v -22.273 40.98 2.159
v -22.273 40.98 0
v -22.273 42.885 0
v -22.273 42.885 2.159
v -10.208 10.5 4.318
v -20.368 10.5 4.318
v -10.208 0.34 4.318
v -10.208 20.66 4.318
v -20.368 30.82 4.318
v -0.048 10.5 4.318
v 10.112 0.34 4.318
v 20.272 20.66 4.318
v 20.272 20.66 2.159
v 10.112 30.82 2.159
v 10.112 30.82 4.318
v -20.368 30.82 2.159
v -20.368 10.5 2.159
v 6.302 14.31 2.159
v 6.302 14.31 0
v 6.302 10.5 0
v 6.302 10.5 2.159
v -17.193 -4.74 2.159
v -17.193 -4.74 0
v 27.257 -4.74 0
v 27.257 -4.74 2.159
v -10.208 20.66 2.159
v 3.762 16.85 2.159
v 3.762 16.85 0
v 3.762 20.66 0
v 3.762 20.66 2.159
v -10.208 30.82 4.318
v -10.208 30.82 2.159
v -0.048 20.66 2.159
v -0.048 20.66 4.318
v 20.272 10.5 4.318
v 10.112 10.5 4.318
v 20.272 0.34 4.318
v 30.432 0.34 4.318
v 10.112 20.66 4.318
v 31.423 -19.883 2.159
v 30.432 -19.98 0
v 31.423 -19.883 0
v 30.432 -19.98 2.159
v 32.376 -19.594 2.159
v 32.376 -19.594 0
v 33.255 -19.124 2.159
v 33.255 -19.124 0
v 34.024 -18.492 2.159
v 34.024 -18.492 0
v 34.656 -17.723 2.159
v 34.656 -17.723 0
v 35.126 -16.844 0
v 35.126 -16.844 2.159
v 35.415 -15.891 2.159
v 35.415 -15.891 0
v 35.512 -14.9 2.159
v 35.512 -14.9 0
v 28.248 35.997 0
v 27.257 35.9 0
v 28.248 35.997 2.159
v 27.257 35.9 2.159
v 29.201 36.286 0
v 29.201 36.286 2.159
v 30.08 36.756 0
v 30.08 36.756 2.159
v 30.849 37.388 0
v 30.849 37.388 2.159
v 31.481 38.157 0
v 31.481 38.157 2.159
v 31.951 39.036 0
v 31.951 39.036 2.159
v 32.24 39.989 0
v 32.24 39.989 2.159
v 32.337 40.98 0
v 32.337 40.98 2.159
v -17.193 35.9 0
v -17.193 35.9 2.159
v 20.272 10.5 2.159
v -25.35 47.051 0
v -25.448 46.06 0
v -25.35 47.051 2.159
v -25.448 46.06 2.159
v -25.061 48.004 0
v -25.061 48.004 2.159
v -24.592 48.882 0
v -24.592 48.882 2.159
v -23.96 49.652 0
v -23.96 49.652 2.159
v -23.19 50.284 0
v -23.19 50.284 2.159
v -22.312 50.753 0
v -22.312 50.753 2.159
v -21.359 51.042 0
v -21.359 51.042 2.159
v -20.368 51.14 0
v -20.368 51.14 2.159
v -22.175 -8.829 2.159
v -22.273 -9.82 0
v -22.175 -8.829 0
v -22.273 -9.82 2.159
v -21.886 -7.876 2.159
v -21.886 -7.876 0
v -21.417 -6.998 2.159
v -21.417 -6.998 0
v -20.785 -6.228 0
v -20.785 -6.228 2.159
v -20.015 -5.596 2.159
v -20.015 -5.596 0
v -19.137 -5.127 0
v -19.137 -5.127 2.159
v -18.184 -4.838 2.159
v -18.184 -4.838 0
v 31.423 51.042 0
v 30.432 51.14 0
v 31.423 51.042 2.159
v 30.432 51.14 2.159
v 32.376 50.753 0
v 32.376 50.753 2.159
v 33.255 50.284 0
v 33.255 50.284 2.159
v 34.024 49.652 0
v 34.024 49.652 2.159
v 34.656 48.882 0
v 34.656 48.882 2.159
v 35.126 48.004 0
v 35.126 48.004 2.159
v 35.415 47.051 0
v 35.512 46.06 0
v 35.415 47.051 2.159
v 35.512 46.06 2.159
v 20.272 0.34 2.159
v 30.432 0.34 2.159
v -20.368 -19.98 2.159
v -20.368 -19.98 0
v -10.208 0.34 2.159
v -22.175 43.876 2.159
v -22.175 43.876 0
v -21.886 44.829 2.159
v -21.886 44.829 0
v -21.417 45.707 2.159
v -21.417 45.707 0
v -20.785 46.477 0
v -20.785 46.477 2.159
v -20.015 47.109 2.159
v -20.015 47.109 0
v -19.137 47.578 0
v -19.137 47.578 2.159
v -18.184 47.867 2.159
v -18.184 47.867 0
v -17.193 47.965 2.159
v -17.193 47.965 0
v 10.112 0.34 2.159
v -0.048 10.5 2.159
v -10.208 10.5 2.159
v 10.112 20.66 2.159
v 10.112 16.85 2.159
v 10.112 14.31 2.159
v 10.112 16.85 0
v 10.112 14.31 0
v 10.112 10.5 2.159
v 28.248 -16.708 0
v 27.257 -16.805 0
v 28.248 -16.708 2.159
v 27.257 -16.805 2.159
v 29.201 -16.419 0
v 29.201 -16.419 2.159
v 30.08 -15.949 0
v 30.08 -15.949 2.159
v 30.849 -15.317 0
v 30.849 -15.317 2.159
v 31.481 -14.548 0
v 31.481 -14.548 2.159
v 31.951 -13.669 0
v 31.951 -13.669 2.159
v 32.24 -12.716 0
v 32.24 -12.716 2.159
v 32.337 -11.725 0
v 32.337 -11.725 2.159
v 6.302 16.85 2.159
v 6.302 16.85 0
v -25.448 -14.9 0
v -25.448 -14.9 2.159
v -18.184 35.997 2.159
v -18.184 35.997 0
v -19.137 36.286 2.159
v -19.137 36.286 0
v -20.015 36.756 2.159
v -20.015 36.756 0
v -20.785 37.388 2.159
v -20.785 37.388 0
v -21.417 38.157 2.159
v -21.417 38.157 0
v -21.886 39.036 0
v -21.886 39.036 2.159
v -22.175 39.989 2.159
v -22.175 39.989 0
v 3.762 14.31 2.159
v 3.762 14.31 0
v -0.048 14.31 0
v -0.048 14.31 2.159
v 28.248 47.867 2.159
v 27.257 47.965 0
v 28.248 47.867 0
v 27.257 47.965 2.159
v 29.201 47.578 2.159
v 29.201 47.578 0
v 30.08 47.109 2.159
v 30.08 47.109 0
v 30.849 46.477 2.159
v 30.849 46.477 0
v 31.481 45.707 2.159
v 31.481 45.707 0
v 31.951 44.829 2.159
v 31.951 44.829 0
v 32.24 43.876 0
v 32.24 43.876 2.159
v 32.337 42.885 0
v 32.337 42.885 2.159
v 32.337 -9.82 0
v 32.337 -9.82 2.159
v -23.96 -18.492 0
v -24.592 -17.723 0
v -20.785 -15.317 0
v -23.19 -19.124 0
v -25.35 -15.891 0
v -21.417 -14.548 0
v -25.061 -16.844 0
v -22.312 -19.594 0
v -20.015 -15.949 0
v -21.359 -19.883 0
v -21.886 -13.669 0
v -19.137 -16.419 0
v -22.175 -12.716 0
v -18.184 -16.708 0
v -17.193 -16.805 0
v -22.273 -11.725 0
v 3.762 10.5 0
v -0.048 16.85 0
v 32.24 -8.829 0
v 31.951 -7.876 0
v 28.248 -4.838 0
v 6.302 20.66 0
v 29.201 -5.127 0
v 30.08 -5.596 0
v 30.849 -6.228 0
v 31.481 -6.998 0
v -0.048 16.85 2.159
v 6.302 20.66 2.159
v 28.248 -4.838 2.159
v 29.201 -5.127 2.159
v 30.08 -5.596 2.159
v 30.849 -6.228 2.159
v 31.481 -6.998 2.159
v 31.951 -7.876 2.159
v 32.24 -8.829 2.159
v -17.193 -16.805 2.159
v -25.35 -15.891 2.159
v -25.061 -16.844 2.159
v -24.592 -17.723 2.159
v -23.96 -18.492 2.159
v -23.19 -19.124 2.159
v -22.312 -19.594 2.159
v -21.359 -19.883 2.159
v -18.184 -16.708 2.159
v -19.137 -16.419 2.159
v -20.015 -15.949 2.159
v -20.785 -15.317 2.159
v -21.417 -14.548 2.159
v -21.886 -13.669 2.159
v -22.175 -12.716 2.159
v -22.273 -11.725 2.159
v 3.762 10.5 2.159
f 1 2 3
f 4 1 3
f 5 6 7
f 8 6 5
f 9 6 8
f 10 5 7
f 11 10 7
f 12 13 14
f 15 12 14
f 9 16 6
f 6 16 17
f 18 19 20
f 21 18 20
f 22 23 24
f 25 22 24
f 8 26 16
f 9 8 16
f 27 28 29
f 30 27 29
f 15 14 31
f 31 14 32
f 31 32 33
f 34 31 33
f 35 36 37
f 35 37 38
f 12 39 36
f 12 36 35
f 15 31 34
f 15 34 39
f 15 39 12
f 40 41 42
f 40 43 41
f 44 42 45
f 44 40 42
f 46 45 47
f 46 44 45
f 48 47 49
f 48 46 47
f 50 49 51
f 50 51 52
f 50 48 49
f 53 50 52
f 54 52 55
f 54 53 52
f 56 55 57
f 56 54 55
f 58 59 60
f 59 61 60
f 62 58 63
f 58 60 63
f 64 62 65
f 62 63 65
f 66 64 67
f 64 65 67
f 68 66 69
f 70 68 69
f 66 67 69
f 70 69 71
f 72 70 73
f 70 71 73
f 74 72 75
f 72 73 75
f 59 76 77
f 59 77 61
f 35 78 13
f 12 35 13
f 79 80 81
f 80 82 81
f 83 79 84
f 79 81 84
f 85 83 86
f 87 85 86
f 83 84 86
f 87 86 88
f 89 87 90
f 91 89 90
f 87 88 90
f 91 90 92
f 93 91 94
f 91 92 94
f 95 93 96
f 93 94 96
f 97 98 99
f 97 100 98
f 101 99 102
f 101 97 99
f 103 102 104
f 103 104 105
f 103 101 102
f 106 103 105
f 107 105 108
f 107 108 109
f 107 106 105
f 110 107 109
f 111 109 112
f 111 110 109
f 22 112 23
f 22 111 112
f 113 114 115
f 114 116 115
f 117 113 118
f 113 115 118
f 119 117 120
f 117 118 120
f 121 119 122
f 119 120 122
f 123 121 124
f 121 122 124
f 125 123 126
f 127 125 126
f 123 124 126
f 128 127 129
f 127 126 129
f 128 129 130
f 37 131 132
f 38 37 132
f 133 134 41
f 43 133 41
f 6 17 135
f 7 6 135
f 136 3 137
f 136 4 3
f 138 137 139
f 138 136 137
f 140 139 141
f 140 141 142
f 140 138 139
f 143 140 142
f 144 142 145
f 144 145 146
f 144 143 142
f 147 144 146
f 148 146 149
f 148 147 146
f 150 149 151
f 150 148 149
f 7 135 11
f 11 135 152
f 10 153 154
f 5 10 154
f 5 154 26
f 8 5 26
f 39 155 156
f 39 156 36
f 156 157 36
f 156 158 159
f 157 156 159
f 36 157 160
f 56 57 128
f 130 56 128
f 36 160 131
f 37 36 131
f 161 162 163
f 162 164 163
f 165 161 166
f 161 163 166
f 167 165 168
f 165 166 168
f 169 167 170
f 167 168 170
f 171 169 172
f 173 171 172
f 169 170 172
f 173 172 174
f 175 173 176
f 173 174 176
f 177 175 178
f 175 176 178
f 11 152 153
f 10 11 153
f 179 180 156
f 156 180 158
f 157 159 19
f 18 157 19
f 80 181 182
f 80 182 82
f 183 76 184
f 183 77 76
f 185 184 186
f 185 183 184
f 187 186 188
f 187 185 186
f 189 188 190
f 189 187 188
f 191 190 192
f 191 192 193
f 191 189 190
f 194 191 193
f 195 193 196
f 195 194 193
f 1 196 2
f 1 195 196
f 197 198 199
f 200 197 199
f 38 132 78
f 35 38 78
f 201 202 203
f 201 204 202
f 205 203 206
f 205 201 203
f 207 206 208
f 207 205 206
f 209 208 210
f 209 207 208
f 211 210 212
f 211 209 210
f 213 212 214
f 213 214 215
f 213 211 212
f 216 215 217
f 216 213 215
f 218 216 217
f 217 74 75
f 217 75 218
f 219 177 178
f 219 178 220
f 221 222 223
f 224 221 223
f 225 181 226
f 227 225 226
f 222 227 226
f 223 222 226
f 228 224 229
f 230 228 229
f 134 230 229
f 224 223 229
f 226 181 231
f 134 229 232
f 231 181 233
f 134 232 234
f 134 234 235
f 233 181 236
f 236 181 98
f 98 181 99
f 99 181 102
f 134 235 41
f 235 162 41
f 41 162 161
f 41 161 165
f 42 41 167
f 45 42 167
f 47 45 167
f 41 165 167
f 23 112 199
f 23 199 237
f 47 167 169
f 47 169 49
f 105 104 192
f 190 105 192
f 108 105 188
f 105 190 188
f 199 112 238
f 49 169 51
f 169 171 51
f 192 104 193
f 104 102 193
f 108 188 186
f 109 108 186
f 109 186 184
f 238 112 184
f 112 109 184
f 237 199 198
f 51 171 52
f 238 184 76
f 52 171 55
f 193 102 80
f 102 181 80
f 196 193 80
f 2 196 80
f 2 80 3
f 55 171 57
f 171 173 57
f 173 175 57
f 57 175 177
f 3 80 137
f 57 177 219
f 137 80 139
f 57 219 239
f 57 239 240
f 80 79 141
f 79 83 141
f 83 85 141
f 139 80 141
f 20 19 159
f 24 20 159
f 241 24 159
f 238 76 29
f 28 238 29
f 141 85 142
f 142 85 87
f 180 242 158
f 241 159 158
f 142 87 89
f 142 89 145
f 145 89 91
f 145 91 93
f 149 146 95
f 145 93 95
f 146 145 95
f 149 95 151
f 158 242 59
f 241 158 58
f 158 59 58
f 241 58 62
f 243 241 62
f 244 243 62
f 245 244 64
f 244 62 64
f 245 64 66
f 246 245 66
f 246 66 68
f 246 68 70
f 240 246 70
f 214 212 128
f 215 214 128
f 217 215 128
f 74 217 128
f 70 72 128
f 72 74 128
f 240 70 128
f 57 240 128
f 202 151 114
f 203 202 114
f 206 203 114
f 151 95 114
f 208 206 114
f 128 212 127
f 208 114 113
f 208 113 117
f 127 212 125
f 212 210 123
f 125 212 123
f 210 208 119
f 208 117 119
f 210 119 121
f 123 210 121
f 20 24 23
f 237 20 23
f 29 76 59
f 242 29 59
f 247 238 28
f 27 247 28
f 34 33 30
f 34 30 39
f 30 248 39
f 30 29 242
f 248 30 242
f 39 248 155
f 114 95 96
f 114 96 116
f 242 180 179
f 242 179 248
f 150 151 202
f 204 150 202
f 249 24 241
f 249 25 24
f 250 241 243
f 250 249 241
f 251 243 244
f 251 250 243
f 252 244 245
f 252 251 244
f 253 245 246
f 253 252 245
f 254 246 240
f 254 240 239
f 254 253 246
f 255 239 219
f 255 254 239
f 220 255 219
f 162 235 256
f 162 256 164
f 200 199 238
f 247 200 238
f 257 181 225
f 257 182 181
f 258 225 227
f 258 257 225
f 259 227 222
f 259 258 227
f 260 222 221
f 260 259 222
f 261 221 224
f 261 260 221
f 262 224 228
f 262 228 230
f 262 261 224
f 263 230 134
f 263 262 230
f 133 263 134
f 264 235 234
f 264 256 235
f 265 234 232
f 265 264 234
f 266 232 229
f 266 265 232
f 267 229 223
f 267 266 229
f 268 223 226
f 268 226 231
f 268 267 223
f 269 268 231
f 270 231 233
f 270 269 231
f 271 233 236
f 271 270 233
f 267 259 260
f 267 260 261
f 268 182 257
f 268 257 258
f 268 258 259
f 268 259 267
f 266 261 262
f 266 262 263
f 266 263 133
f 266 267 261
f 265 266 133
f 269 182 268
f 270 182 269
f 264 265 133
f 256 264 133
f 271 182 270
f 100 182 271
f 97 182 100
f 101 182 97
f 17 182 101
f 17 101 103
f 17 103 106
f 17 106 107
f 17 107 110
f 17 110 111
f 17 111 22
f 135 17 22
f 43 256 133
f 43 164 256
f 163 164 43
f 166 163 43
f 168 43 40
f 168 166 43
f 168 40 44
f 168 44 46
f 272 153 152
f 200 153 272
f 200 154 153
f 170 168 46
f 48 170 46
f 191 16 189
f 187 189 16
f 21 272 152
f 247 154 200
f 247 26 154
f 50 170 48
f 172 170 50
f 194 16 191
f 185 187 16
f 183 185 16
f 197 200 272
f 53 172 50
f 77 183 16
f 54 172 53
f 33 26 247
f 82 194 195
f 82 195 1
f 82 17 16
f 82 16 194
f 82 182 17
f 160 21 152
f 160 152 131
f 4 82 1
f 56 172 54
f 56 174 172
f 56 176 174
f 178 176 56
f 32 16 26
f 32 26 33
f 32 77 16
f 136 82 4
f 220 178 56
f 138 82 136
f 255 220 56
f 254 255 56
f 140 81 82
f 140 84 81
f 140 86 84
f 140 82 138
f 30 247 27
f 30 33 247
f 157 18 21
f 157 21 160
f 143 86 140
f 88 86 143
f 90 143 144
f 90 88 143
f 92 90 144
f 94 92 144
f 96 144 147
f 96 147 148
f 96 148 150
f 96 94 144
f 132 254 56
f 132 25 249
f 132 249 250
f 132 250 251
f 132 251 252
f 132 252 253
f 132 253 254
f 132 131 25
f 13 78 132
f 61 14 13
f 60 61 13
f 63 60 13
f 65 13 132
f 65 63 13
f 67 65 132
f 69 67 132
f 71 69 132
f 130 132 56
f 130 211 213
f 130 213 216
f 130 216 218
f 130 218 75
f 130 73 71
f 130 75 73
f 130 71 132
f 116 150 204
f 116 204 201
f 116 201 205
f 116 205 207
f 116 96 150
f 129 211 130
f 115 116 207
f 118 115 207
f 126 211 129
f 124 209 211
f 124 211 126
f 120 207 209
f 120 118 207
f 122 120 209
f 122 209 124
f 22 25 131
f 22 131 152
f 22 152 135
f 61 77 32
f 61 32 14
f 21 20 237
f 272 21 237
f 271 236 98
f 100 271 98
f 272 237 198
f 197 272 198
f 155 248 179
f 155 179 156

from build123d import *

# Parameters (mm, degrees)
F1_DEPTH = 4.318
F0_W     = 60.96
F0_H     = 71.12
F0_W_2   = 54.61
F0_H_2   = 12.065
F0_W_3   = 3.81
F0_H_3   = 3.81
F2_DEPTH = 2.159
F3_R     = 5.08


with BuildPart() as f1:
    # F0 (on Top) → F1 (new body)
    with BuildSketch(Plane.XY):
        Polygon((-10.2077507393, 20.6597218627), (-20.3677507393, 30.8197218627), (-20.3677507393, 20.6597218627), align=None)
        Polygon((-10.2077507393, 20.6597218627), (-20.3677507393, 20.6597218627), (-20.3677507393, 10.4997218627), align=None)
        Polygon((-10.2077507393, 10.4997218627), (-10.2077507393, 20.6597218627), (-20.3677507393, 10.4997218627), align=None)
        Polygon((-10.2077507393, 10.4997218627), (-20.3677507393, 10.4997218627), (-10.2077507393, 0.3397218627), align=None)
        Polygon((-0.0477507393, 10.4997218627), (-10.2077507393, 10.4997218627), (-10.2077507393, 0.3397218627), (10.1122492607, 0.3397218627), align=None)
    extrude(amount=F1_DEPTH)



with BuildPart() as f1b:
    # F0 (on Top) → F1, piece 2 (new body)
    with BuildSketch(Plane.XY):
        Polygon((-0.0477507393, 30.8197218627), (-10.2077507393, 30.8197218627), (-0.0477507393, 20.6597218627), align=None)
        Polygon((10.1122492607, 20.6597218627), (-0.0477507393, 30.8197218627), (-0.0477507393, 20.6597218627), (3.7622492607, 20.6597218627), (6.3022492607, 20.6597218627), align=None)
        Polygon((10.1122492607, 30.8197218627), (-0.0477507393, 30.8197218627), (10.1122492607, 20.6597218627), align=None)
        Polygon((20.2722492607, 20.6597218627), (10.1122492607, 30.8197218627), (10.1122492607, 20.6597218627), align=None)
        Polygon((20.2722492607, 20.6597218627), (10.1122492607, 20.6597218627), (10.1122492607, 16.8497218627), (10.1122492607, 14.3097218627), (10.1122492607, 10.4997218627), (20.2722492607, 0.3397218627), (30.4322492607, 0.3397218627), (20.2722492607, 10.4997218627), align=None)
    extrude(amount=F1_DEPTH)


with BuildPart() as f1_1:
    add(f1.part)

    add(f1b.part)  # F2 merges F1b
    # F0 (on Top) → F2 (join)
    with BuildSketch(Plane.XY):
        with Locations((5.0322492607, 15.5797218627)):
            Rectangle(F0_W, F0_H)
        Polygon((-20.3677507393, 20.6597218627), (-20.3677507393, 30.8197218627), (-10.2077507393, 20.6597218627), (-10.2077507393, 10.4997218627), (-0.0477507393, 10.4997218627), (10.1122492607, 0.3397218627), (-10.2077507393, 0.3397218627), (-20.3677507393, 10.4997218627), align=None, mode=Mode.SUBTRACT)
        with Locations((5.0322492607, -10.7727781373)):
            Rectangle(F0_W_2, F0_H_2, mode=Mode.SUBTRACT)
        with Locations((5.0322492607, 41.9322218627)):
            Rectangle(F0_W_2, F0_H_2, mode=Mode.SUBTRACT)
        Polygon((-0.0477507393, 20.6597218627), (-10.2077507393, 30.8197218627), (-0.0477507393, 30.8197218627), (10.1122492607, 30.8197218627), (20.2722492607, 20.6597218627), (20.2722492607, 10.4997218627), (30.4322492607, 0.3397218627), (20.2722492607, 0.3397218627), (10.1122492607, 10.4997218627), (10.1122492607, 14.3097218627), (6.3022492607, 14.3097218627), (6.3022492607, 10.4997218627), (3.7622492607, 10.4997218627), (3.7622492607, 14.3097218627), (-0.0477507393, 14.3097218627), (-0.0477507393, 16.8497218627), (3.7622492607, 16.8497218627), (3.7622492607, 20.6597218627), align=None, mode=Mode.SUBTRACT)
        with Locations((8.2072492607, 18.7547218627)):
            Rectangle(F0_W_3, F0_H_3)
    extrude(amount=F2_DEPTH)

    # F3
    f3_edges = [f1_1.edges().sort_by_distance(p)[0] for p in [
        (-25.447751, -19.980278, 1.0795),
        (35.512249, -19.980278, 1.0795),
        (35.512249, 51.139722, 1.0795),
        (-25.447751, 51.139722, 1.0795),
        (-22.272751, -16.805278, 1.0795),
        (-22.272751, -4.740278, 1.0795),
        (-22.272751, 47.964722, 1.0795),
        (-22.272751, 35.899722, 1.0795),
        (32.337249, -16.805278, 1.0795),
        (32.337249, 35.899722, 1.0795),
        (32.337249, 47.964722, 1.0795),
        (32.337249, -4.740278, 1.0795),
    ]]
    fillet(f3_edges, radius=F3_R)


solid = f1_1.part
